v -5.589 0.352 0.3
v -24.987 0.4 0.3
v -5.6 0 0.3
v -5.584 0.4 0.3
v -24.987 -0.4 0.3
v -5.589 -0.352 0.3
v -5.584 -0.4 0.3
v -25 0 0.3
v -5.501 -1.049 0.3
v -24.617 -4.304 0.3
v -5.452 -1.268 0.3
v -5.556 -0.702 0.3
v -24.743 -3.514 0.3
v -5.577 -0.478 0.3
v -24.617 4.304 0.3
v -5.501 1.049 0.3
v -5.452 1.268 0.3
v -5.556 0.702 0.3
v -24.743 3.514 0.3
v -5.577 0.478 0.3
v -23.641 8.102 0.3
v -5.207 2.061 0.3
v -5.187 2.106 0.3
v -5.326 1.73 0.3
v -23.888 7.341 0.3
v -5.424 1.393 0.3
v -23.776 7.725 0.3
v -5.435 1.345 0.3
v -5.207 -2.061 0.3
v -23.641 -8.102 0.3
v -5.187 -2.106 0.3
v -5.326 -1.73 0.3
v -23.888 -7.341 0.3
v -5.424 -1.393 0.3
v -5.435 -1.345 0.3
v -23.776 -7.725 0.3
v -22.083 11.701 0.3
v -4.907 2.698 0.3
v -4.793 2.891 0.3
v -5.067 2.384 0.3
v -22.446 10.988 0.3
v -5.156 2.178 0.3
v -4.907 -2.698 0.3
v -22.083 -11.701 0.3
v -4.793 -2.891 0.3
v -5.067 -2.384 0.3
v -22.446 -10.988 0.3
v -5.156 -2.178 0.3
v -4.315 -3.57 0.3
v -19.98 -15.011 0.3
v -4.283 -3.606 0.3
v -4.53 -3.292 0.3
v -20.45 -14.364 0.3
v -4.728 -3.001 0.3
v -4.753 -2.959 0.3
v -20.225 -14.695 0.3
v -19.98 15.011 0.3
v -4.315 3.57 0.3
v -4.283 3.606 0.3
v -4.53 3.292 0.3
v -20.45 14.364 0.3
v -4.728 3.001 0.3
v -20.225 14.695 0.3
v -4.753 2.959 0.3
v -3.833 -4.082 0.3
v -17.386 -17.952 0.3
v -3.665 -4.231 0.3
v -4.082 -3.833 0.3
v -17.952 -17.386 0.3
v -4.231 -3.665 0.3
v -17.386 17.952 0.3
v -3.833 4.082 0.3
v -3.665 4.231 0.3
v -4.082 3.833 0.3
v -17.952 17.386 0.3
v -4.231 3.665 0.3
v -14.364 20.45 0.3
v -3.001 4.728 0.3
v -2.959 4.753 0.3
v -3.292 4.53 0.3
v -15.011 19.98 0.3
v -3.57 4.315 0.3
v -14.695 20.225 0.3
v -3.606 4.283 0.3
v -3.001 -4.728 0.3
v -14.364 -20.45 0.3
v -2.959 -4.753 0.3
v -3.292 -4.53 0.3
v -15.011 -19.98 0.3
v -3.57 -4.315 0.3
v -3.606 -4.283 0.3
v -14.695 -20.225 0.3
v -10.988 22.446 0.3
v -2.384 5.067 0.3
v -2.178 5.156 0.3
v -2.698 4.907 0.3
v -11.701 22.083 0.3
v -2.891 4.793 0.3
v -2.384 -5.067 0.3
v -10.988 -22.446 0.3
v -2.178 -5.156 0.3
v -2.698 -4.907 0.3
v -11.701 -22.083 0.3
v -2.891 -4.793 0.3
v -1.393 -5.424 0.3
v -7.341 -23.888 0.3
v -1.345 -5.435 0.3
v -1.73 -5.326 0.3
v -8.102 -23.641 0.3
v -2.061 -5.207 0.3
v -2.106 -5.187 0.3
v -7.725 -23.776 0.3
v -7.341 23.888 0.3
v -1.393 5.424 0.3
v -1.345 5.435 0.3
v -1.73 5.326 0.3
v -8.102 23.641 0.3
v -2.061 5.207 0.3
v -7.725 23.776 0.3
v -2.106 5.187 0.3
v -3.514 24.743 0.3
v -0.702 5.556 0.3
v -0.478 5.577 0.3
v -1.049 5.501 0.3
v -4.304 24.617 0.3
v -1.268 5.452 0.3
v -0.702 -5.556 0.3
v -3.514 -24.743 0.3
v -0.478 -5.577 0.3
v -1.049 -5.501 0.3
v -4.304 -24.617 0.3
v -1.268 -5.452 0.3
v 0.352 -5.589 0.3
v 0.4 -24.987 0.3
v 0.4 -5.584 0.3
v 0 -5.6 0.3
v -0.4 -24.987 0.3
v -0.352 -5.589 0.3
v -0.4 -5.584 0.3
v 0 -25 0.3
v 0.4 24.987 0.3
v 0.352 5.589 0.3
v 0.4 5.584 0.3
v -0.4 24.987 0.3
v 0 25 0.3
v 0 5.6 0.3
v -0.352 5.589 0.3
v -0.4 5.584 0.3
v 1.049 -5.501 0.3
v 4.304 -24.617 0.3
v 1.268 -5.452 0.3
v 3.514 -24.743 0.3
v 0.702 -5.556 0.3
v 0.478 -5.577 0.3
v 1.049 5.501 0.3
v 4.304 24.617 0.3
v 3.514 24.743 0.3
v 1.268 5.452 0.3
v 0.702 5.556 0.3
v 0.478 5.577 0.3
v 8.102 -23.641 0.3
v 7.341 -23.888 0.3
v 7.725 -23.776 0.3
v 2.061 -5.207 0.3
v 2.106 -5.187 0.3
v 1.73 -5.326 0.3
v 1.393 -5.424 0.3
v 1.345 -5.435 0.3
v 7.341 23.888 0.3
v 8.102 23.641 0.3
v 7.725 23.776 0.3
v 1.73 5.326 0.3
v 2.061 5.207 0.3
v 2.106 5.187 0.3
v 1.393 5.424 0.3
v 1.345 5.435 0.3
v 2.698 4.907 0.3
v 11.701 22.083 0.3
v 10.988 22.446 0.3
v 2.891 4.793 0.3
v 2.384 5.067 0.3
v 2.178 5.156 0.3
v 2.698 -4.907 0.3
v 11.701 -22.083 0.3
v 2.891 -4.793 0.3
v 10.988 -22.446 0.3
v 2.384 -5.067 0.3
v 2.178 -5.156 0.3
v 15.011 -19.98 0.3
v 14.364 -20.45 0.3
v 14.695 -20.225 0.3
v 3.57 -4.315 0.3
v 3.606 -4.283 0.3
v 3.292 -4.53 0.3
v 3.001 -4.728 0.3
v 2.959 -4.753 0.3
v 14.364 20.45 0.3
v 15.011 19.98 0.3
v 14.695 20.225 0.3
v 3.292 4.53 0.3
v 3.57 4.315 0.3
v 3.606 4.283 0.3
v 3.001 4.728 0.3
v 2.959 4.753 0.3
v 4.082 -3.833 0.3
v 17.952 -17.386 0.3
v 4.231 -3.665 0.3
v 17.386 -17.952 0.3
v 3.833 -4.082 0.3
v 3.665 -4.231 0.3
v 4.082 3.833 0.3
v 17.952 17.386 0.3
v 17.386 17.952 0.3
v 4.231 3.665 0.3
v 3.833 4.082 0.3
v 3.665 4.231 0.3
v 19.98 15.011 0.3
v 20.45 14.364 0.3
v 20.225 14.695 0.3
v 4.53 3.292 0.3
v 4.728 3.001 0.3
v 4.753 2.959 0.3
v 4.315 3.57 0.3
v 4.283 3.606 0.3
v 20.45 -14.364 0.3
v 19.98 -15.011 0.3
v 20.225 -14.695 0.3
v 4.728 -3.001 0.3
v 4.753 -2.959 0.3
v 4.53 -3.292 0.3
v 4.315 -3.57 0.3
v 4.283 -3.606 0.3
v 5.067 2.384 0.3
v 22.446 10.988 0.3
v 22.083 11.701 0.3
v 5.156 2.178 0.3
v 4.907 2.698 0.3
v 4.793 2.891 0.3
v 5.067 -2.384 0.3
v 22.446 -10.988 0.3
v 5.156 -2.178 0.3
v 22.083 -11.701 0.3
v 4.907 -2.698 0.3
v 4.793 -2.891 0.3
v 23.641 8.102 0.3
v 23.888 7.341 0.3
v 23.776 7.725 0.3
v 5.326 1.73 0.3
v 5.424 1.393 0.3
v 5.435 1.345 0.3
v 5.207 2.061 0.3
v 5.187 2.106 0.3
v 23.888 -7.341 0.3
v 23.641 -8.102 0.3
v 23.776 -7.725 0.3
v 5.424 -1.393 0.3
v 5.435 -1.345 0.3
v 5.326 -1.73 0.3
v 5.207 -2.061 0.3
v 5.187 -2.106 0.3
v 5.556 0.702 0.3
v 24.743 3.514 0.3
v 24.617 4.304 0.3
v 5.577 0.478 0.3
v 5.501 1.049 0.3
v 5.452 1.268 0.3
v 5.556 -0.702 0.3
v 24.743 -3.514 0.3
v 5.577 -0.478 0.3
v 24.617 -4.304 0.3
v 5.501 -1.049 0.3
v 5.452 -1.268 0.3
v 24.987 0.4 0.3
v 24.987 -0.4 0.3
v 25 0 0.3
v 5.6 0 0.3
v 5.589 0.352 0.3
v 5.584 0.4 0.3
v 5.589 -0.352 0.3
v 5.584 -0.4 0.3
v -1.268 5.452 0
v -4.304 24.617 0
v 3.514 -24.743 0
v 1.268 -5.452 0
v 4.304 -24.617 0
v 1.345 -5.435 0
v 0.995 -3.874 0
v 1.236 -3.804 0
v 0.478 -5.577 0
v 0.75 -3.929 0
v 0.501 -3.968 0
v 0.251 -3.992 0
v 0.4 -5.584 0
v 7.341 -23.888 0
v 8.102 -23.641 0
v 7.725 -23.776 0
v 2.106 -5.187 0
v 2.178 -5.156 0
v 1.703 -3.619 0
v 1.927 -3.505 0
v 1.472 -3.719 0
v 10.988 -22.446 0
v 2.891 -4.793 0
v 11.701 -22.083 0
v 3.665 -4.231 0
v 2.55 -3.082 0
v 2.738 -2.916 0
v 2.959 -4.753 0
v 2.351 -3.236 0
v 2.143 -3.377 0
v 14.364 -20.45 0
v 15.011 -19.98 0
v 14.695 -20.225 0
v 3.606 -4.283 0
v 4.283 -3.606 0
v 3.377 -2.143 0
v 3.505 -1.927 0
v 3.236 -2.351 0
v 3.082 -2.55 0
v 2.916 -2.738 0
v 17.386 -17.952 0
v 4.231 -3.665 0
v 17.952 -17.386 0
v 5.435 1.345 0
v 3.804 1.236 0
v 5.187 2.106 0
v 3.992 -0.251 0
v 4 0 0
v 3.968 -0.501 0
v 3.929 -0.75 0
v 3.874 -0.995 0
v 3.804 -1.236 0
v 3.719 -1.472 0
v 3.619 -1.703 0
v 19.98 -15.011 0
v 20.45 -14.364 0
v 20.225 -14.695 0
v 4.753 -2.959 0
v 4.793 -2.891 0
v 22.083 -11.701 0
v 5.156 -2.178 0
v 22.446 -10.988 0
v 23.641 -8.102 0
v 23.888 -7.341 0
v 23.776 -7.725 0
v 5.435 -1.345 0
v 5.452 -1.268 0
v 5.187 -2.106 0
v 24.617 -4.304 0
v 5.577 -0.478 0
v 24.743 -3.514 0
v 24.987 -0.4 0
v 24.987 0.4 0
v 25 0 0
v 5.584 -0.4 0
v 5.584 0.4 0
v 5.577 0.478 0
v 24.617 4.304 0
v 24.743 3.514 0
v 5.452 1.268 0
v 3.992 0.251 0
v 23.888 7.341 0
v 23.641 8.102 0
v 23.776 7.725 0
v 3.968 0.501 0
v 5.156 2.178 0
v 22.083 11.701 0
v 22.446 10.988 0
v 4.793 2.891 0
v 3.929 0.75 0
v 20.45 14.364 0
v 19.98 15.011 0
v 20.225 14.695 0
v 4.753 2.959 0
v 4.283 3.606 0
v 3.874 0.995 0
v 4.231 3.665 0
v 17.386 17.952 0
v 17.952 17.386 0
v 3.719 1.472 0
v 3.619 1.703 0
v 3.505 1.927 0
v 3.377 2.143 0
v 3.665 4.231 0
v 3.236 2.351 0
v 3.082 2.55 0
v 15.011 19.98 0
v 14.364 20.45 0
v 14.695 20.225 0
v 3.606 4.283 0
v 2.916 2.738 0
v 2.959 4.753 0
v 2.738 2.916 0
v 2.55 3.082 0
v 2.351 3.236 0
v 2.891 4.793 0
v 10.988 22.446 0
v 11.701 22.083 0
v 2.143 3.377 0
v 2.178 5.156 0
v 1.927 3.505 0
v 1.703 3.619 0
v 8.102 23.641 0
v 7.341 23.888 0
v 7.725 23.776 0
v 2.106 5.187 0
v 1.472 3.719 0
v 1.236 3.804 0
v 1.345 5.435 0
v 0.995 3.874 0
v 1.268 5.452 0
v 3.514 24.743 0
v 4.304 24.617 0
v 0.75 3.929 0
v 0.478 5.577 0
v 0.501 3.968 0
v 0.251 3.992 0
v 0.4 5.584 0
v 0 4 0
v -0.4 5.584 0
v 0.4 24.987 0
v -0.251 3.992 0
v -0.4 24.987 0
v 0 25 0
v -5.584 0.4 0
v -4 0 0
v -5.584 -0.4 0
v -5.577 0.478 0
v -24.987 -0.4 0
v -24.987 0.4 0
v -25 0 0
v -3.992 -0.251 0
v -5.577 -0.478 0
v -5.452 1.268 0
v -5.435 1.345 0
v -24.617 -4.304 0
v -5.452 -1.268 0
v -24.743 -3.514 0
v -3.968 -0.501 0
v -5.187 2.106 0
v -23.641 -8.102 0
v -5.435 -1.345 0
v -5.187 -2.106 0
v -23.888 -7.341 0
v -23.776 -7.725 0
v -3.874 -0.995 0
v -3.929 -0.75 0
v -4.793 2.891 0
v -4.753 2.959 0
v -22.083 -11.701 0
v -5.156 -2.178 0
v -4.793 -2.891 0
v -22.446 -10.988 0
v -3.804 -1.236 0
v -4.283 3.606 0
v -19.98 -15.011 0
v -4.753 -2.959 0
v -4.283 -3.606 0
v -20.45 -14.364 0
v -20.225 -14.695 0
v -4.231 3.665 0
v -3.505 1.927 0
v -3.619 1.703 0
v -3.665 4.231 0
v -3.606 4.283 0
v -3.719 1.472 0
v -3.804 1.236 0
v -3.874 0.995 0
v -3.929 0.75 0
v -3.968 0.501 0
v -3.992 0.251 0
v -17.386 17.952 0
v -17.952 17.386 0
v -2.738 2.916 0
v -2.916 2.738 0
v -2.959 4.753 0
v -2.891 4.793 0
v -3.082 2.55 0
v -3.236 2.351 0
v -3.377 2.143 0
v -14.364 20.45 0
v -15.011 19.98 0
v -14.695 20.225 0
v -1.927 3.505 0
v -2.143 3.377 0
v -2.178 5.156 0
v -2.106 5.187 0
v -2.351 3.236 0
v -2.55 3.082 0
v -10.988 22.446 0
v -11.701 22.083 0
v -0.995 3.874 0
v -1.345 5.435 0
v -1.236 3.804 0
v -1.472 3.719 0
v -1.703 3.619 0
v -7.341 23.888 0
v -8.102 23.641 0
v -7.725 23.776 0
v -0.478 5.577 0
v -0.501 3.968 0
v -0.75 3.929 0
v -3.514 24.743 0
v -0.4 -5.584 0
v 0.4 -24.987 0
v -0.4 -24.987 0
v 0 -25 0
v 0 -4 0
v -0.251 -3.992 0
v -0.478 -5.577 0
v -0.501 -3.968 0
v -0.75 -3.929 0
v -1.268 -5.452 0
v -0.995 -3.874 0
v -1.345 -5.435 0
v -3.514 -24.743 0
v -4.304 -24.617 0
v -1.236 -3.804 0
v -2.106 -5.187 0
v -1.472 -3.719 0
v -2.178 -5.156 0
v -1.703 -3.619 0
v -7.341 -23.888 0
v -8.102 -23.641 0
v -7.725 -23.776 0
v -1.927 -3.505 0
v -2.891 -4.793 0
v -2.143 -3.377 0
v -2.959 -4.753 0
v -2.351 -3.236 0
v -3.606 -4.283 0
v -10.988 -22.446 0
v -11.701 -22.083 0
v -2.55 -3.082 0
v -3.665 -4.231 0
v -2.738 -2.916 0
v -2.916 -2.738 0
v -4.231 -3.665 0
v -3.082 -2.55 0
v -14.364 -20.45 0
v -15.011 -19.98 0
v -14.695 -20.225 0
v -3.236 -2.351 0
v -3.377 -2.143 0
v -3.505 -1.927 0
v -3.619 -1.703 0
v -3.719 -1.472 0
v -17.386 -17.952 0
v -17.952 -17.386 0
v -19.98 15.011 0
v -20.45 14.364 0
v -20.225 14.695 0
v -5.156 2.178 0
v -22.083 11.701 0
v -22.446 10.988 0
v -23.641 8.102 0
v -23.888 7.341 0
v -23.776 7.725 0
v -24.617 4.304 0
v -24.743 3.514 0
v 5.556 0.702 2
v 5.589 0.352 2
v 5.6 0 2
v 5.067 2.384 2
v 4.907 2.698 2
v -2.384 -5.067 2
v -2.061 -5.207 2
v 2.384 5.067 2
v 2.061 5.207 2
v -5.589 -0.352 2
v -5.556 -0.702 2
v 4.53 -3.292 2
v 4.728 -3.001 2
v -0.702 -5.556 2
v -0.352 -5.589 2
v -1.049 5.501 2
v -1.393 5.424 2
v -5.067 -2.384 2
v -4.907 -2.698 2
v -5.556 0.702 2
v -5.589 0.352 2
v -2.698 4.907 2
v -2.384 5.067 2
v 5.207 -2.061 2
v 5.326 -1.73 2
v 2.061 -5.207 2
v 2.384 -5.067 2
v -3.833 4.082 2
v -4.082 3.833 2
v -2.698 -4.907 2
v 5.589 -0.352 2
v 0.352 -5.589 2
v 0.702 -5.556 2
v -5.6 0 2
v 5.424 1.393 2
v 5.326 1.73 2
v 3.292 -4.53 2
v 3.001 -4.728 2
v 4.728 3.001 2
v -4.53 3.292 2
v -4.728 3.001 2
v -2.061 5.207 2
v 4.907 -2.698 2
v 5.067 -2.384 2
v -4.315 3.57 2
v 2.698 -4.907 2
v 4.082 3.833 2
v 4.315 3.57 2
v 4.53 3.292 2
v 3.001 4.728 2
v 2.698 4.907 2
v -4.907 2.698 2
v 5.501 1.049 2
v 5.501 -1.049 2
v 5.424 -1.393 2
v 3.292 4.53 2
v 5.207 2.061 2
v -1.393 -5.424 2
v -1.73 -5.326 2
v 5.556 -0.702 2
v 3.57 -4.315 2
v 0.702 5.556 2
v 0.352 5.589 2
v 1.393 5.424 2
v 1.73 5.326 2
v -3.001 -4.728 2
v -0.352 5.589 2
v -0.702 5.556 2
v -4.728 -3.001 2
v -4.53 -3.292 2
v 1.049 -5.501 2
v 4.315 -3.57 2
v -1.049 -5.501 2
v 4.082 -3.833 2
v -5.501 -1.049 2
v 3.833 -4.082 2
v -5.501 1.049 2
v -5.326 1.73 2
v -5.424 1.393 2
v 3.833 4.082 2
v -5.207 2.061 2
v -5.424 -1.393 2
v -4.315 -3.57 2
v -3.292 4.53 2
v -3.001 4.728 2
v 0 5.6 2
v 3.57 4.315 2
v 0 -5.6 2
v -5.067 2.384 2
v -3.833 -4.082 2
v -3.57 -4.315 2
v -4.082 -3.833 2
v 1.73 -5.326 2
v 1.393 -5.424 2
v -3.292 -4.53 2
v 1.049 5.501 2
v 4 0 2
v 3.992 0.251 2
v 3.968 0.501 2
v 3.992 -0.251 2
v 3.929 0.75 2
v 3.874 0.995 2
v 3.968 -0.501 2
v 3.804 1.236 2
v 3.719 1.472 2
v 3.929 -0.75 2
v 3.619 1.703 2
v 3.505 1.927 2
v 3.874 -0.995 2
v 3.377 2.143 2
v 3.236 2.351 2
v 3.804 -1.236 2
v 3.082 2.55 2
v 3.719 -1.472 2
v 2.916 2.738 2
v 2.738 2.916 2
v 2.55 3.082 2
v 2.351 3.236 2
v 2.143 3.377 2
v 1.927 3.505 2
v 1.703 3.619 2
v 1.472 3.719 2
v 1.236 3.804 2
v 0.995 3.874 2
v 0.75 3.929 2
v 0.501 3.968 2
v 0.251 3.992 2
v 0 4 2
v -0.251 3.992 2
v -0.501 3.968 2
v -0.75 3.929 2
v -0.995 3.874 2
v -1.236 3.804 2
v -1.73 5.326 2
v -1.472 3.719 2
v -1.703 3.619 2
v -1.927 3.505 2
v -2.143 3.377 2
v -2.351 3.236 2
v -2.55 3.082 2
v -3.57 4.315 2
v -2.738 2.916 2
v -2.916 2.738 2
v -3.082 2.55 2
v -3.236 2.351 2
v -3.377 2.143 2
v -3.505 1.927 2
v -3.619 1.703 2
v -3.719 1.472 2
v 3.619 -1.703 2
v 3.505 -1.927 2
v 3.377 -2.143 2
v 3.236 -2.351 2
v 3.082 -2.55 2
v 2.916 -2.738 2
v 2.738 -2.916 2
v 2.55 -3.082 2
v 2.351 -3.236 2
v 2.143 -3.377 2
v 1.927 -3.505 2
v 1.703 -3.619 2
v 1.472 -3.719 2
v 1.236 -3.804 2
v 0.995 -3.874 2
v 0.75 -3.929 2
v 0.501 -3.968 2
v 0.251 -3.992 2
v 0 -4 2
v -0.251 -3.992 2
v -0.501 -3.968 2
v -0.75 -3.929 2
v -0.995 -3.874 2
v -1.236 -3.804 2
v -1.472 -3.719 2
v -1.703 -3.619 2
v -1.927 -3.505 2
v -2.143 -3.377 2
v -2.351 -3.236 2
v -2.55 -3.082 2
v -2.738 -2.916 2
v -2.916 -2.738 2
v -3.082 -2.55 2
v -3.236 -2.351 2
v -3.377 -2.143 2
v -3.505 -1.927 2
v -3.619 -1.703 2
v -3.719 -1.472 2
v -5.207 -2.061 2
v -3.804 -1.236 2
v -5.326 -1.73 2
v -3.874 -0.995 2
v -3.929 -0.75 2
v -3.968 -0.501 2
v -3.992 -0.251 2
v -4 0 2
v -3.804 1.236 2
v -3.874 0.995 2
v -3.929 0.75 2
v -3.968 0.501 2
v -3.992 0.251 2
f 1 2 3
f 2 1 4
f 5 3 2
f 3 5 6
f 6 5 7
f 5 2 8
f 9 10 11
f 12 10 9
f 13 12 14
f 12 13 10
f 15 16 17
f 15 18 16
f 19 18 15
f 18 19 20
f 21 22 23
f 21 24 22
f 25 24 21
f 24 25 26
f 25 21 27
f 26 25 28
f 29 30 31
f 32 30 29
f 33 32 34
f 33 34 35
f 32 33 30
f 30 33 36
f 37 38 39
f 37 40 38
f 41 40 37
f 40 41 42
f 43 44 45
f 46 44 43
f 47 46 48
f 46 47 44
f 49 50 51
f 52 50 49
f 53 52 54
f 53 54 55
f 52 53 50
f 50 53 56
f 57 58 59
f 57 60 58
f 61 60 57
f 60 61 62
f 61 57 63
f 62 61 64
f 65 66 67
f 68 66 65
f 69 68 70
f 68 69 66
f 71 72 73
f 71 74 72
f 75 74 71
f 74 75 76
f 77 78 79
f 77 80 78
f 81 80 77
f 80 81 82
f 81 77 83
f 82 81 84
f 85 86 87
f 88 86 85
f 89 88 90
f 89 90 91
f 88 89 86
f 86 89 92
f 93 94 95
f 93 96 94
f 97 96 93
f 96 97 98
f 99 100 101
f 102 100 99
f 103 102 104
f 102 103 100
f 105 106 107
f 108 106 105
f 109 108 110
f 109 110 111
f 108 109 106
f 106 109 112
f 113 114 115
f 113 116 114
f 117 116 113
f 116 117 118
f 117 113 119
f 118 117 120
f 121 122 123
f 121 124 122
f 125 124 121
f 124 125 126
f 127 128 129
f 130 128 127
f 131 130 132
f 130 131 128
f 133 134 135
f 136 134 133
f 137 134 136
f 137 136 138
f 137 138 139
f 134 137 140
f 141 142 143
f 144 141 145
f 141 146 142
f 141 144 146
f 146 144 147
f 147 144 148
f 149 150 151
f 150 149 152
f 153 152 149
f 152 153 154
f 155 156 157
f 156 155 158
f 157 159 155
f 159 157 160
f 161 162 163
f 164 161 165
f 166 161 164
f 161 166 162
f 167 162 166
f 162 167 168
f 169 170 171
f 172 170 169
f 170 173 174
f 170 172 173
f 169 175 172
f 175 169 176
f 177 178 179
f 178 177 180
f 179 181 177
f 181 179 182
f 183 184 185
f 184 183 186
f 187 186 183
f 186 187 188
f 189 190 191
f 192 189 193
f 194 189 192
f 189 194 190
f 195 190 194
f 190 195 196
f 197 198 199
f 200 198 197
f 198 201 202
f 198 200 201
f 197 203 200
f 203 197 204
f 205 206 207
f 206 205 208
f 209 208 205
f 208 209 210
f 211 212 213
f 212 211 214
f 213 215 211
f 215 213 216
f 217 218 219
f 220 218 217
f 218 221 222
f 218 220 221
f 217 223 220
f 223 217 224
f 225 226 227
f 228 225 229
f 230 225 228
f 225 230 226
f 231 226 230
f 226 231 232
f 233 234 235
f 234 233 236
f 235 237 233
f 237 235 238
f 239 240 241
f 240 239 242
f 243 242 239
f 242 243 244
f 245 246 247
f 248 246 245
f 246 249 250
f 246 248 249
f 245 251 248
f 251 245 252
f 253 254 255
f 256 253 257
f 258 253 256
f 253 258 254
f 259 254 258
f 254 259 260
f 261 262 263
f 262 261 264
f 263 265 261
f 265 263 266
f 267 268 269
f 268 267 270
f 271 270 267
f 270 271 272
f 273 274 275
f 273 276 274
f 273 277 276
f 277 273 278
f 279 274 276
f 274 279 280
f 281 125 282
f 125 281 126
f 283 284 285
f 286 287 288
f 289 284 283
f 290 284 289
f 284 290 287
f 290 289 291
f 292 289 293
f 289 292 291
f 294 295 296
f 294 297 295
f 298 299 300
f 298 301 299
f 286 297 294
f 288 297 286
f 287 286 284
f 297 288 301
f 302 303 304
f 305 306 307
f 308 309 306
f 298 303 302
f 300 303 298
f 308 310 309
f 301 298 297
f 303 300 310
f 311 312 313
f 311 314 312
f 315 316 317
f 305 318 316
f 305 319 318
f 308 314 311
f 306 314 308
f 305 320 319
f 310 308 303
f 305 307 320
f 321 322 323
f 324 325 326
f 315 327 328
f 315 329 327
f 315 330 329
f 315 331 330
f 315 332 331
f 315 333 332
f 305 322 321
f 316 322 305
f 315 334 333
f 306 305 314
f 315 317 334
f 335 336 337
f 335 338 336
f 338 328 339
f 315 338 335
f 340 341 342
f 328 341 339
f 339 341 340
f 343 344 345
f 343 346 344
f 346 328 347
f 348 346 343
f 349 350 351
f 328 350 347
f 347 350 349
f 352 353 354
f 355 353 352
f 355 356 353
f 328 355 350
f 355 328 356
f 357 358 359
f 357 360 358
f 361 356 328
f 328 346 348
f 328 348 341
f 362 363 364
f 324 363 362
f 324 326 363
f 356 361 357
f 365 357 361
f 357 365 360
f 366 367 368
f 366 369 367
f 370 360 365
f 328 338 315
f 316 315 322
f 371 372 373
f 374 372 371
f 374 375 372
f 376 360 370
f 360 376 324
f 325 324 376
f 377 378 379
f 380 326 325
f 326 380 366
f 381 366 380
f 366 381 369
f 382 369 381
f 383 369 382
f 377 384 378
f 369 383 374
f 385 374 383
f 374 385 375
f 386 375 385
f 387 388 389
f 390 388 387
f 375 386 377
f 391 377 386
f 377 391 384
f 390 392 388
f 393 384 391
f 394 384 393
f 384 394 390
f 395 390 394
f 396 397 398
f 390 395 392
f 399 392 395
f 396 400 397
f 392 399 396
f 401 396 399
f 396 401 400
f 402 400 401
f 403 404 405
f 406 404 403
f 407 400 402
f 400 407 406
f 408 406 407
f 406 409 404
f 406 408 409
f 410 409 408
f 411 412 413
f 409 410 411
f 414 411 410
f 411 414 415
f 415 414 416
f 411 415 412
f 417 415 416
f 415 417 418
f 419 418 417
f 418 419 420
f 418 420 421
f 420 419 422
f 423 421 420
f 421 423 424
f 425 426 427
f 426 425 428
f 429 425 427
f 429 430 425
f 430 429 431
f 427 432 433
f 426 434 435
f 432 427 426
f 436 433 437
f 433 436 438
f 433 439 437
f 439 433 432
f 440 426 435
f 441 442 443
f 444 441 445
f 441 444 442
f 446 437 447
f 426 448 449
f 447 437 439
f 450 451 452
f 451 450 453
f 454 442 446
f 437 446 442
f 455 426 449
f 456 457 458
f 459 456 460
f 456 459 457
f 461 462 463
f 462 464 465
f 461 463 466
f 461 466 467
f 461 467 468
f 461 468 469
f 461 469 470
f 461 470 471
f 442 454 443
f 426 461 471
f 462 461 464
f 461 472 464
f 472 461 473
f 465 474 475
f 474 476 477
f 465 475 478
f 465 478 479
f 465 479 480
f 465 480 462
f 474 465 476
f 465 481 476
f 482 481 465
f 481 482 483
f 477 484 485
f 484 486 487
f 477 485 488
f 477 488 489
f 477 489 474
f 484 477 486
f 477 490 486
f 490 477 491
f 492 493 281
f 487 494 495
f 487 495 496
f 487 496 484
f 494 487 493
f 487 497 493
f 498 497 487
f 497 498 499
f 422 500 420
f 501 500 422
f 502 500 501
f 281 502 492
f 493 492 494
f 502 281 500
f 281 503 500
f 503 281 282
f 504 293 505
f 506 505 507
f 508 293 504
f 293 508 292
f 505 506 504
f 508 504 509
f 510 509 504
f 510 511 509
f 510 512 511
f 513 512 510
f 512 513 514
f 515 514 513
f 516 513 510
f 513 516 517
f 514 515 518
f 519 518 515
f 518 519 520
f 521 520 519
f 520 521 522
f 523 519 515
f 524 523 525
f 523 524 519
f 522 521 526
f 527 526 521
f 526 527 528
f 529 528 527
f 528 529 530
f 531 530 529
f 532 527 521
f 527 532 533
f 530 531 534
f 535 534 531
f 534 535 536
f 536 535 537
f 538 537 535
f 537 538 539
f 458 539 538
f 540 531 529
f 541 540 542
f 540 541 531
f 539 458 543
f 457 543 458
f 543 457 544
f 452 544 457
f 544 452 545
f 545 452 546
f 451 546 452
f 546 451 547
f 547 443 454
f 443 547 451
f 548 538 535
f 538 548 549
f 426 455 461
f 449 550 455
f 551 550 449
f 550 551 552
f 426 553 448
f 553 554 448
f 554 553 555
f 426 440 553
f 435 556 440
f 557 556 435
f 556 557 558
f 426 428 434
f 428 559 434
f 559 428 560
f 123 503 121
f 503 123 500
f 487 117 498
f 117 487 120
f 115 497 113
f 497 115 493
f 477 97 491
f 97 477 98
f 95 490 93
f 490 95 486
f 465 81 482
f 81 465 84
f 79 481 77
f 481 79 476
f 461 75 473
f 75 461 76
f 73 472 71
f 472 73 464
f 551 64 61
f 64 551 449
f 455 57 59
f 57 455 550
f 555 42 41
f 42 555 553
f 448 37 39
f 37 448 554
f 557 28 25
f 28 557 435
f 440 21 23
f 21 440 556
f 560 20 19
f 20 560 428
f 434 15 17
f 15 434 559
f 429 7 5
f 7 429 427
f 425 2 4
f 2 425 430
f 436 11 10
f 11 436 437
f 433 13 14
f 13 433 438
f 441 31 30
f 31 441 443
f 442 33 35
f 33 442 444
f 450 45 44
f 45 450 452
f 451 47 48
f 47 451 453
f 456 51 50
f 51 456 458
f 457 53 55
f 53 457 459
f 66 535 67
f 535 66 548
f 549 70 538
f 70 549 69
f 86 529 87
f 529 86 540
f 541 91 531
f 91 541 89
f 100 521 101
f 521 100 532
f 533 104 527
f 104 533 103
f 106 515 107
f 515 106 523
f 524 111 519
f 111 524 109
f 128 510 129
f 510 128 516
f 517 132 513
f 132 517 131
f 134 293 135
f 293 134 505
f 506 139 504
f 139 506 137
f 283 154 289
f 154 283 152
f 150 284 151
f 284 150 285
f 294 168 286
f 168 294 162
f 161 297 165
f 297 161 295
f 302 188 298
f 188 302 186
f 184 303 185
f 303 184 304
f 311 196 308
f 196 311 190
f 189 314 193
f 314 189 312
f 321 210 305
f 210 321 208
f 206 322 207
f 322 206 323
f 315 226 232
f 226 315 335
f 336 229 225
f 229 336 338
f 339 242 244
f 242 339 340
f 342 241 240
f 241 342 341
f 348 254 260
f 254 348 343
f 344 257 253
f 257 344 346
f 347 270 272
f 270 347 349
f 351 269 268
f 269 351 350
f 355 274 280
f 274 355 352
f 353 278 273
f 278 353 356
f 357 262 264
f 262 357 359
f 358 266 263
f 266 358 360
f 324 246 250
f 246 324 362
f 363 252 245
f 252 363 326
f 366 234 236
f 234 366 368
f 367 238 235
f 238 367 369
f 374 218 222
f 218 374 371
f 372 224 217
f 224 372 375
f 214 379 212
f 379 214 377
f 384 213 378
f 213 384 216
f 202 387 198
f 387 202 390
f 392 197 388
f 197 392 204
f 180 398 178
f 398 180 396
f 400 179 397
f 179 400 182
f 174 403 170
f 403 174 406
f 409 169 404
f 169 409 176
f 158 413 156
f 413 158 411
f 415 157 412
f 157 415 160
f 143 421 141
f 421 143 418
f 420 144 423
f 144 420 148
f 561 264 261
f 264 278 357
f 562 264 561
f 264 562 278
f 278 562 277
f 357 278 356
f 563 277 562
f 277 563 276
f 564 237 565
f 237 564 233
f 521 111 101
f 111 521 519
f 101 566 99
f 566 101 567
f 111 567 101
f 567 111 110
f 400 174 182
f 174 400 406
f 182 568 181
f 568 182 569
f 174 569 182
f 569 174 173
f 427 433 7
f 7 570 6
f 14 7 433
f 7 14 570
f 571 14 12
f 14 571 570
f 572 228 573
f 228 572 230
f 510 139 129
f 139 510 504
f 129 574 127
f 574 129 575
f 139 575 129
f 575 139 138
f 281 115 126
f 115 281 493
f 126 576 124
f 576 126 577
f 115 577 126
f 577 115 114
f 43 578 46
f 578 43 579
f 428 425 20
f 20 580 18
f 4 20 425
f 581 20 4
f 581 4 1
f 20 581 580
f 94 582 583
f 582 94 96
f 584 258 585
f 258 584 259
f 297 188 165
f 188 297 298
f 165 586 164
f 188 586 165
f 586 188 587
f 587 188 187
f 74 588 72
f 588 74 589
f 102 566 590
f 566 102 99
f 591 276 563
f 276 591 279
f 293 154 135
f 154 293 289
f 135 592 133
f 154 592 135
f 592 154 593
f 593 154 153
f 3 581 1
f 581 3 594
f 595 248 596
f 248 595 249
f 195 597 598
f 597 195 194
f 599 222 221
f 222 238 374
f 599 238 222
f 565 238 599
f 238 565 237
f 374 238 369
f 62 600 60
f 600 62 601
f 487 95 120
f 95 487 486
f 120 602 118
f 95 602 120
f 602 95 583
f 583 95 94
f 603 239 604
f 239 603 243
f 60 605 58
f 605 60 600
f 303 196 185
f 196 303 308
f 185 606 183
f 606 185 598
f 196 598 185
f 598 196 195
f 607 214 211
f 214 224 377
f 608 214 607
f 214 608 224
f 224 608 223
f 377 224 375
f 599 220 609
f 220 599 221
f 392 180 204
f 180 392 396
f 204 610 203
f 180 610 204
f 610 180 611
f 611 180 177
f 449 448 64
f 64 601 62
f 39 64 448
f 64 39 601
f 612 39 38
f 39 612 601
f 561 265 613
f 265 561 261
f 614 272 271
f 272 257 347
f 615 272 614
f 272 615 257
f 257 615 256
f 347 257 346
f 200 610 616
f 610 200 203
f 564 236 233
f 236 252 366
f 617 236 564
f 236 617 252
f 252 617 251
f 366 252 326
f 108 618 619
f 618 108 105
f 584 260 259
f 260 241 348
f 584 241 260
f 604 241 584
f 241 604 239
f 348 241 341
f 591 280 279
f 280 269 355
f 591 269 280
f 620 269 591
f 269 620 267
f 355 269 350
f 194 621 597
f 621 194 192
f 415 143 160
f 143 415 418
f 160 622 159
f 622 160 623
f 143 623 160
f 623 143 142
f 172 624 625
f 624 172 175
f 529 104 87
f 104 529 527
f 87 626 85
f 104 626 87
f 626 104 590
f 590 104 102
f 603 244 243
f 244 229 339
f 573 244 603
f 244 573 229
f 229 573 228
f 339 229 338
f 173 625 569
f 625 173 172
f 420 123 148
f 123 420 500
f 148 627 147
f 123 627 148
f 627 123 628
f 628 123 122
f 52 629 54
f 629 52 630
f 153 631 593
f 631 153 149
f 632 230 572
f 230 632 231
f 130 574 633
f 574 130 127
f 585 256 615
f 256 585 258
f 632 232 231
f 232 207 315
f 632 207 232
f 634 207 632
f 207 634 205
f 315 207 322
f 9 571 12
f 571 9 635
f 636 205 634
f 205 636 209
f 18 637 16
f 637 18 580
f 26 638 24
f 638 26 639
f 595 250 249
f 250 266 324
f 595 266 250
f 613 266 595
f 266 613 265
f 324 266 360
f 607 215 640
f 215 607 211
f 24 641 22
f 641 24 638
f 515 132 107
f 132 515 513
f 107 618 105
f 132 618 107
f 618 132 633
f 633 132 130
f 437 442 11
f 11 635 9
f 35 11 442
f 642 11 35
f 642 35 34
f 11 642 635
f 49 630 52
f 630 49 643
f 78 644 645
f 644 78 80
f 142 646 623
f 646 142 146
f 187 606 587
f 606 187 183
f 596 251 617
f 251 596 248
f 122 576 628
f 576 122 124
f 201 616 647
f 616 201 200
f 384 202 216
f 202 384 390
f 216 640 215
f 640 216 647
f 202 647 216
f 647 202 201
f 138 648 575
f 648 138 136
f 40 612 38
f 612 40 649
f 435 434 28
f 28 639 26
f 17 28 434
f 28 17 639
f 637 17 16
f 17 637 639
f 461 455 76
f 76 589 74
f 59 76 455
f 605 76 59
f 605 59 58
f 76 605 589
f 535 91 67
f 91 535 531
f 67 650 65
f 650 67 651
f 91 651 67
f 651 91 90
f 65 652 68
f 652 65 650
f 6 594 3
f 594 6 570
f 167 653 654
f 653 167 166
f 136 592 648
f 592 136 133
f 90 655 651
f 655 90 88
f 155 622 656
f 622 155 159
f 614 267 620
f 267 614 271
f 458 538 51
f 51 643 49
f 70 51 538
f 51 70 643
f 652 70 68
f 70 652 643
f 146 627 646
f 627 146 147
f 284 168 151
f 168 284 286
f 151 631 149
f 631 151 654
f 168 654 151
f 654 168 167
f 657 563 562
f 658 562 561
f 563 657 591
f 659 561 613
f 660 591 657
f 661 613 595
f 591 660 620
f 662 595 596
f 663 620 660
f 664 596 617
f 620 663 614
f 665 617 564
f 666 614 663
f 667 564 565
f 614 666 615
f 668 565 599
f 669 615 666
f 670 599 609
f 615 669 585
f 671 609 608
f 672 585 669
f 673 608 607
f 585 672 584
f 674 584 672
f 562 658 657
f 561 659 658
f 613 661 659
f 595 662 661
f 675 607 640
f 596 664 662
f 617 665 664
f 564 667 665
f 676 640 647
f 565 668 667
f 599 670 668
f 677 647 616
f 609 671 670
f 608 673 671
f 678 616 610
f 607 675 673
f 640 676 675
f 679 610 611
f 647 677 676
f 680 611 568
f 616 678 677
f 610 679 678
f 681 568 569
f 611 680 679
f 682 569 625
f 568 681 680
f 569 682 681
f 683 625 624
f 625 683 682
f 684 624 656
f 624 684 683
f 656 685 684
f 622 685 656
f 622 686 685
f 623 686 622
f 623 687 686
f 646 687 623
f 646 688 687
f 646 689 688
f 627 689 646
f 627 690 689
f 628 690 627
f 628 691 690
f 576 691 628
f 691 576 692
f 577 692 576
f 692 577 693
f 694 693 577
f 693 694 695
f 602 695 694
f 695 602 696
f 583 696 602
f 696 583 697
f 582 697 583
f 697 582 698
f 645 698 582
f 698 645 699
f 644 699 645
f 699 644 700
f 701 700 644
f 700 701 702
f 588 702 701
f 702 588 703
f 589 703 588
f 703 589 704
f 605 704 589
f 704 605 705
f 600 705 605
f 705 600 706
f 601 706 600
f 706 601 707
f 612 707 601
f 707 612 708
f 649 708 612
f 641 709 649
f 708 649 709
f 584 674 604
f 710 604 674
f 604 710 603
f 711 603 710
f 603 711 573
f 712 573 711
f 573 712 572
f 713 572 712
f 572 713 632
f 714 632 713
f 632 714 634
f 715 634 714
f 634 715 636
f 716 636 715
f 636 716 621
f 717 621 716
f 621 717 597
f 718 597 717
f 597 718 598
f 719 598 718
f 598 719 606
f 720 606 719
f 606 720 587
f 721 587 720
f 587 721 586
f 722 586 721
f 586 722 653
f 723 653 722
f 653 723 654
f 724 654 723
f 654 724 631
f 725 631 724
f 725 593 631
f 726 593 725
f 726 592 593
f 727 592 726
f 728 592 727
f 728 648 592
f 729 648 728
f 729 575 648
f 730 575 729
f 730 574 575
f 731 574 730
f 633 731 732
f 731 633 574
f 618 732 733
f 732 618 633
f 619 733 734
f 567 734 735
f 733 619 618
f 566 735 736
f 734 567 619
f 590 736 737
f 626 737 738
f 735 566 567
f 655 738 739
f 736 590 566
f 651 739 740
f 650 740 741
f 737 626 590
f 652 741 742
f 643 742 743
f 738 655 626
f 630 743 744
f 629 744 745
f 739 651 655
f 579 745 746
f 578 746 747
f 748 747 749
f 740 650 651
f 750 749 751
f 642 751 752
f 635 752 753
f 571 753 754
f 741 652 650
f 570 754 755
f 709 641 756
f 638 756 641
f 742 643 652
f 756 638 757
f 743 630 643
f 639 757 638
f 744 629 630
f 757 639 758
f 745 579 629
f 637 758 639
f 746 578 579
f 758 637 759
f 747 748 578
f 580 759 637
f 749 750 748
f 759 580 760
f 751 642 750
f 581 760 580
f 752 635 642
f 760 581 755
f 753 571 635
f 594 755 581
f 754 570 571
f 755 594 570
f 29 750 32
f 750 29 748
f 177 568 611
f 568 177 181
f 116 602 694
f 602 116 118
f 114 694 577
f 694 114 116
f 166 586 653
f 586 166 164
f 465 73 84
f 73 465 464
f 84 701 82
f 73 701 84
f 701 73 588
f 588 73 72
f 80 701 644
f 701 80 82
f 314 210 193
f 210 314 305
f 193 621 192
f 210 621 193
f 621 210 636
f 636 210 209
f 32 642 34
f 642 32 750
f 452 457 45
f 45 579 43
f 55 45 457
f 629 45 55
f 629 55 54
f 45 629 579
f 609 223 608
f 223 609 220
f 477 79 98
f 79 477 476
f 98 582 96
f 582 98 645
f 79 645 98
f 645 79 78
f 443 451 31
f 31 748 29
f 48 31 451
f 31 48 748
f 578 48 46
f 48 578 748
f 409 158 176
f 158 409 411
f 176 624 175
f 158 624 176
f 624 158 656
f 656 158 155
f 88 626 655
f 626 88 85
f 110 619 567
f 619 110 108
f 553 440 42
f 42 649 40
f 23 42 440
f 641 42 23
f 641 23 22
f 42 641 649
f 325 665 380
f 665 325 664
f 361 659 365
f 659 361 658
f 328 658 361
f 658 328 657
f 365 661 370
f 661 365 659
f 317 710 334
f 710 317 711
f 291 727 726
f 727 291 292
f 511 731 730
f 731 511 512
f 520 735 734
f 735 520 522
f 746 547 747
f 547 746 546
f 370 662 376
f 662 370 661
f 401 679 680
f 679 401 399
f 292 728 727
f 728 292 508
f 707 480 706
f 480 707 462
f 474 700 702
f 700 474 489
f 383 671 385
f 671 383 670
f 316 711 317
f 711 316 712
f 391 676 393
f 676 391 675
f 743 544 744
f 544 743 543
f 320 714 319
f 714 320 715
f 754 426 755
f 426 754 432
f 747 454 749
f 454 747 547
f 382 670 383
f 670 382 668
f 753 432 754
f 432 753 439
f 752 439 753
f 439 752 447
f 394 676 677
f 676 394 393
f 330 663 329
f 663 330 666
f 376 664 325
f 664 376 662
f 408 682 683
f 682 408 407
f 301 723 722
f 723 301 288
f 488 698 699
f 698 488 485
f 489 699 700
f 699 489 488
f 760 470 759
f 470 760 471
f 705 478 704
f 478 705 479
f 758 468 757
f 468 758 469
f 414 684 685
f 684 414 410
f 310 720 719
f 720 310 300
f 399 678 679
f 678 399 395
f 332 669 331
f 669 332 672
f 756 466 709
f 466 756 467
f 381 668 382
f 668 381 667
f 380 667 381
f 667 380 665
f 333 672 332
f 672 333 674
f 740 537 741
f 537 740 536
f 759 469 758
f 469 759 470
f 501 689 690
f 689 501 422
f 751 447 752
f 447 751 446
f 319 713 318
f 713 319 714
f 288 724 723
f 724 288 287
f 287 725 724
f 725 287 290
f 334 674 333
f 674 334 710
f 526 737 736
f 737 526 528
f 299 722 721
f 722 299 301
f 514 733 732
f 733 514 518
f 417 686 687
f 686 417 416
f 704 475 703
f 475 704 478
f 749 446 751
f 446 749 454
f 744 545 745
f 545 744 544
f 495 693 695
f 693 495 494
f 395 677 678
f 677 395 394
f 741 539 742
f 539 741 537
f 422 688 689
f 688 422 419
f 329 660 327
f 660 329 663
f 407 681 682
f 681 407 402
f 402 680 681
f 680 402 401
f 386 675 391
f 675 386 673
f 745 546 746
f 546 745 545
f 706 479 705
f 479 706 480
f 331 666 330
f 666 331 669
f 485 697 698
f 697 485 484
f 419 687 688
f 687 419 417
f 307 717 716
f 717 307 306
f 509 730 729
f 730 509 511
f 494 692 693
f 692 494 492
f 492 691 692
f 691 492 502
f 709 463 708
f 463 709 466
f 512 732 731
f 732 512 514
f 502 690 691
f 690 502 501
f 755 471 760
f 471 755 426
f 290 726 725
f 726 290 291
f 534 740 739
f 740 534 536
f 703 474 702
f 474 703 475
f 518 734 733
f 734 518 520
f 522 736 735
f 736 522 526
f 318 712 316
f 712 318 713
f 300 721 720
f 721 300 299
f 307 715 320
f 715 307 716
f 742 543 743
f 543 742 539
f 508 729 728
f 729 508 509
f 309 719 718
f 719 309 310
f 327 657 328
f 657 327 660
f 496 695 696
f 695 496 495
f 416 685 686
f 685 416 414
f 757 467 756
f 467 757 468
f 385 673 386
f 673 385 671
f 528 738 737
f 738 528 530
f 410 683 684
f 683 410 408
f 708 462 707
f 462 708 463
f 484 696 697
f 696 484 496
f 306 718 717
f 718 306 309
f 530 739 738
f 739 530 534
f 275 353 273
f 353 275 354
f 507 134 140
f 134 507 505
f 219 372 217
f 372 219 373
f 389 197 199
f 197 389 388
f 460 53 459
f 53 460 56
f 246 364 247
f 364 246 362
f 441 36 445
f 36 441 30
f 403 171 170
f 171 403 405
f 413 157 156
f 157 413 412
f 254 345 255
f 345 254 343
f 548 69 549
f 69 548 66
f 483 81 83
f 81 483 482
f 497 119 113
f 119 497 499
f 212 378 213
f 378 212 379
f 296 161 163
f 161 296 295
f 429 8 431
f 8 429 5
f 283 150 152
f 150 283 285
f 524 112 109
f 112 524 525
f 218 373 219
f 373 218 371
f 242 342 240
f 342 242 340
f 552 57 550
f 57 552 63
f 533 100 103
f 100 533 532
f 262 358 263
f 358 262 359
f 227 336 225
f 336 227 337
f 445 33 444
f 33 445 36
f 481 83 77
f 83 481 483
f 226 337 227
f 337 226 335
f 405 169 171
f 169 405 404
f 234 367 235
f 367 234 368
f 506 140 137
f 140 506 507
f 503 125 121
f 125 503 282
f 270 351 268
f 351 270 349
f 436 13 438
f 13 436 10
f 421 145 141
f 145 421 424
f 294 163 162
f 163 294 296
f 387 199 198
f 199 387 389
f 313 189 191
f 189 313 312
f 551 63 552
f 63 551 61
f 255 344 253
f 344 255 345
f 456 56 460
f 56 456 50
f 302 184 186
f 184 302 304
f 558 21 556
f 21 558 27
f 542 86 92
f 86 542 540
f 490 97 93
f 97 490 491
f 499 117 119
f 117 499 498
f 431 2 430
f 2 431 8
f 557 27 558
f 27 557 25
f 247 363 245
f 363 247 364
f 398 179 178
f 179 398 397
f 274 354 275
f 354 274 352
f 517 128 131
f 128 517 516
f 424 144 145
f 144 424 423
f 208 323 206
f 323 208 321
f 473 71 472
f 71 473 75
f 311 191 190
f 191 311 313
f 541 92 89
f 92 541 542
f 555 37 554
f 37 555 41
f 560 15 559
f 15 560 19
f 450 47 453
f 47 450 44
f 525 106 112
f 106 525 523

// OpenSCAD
//bottle brush creator - v2.7.4
//Mark G. Peeters August 16, 2015 CC BY-SA
//inspired by drooloops flowers
//more details are posted here:
//https://www.youmagine.com/designs/bottle-brush-customizable/
//http://www.thingiverse.com/thing:980106
// preview[view:west, tilt:top diagonal]


/* [choose parts to print] */
//print what?
print=0;//[0:bristles_layer,1:centerpost]
//for keyed center only (see post settings tab) - number stagger layers used
staggers=2;//[2:two stagger parts,3:three stagger parts]
//which stagger to print, generate one at a time, NOTE!- there will be a notch made in the center support corresponding the the part number. So 1st part has one notch, 2nd part has 2 notches, etc
stag_num=1;//[1:1st stagger part,2:2nd stagger part,3:3rd stagger part]

/* [brush settings] */
//number of bristle per layer
b_number=40; //[1:50]
//outer radius of brush bristle
brush_od=25;//25
//center support radius outer OD
center_support=5.6;//5.6
//center support radius of hole ID
center_hole=4;//4

/* [central post settings] */
//center keyed? this make center a D hole
center_key=0;//[0:no,1:yes]
//decimal percent key depth from center zero to one
center_key_depth=0.6;//0.6
//length of central post
post_z=16;//16
//mount hole radius
post_mount_hole=2.2;//2.2
//fit tolerance, radius value
tol=0.2;//0.2

/* [advanced settings] */
//bristle width - flatness
b_width=0.8;//0.8
//bristle height - thickness
b_height=0.3;//0.3
//bristle layer spacing on shaft - how far in between bristles (NOTE: minimum setting is equal to bristle height
b_space_z=2;//2
//bristle rise above print bed, zero for flat, 0.3 or more for drooloop
b_rize=0.0;//0.0
//central post transition at tip
post_tip_z=0.7;//0.7
//central post mm to shrink at tip
post_tip_shrink=0.7;//0.7

/* [Hidden] */

//key rotation
key_rot=(360/b_number)/staggers;
//key_rot=40;

//handle parameters
//brush handle or mount hole (not used in 2.7)
handle=0;//[0:handle,1:mount hole]
handle_length=50;//length of handle if used
handle_radius=5;//radius for handle if used make smaller that hole
$fn=100;

if (print==0){//print bristle layer
   
    if (center_key==1){
   difference(){//put layer indicator on bristle
       union(){
  layer(b_number,b_width,brush_od,b_height,center_hole,center_support,b_space_z,b_rize);  
    holekey(center_hole,key_rot*stag_num,b_space_z,center_support,center_key_depth);
       }//end union
    translate([0,0,b_space_z-0.2])bristles_ind(stag_num,b_width,brush_od,b_height);
   }//end diff bristle indicator
  }
  
  if (center_key==0){
  layer(b_number,b_width,brush_od,b_height,center_hole,center_support,b_space_z,b_rize);  
  }
}
//end print choices



if (print==1){//print center post
    
if (handle==1){//add handle    
post(center_hole,post_z,center_key_depth,tol,post_tip_z,post_tip_shrink);
    translate([0,0,post_z])cylinder(r=handle_radius,h=handle_length);
}//end add handle          
  
   if (handle==0){//make hole    
   rotate([180,0,0])difference(){
post(center_hole,post_z,center_key_depth,tol,post_tip_z,post_tip_shrink);
    translate([0,0,-(post_tip_z+1)])cylinder(r=post_mount_hole,h=post_z+post_tip_z+5,$fn=100);
   }//end diff
}//end add hole  

//add cap
rotate([180,0,0])difference(){
translate([center_hole*3,0,post_z])cylinder(r=center_hole+1,h=1);
translate([center_hole*3,0,-(post_tip_z+1)])cylinder(r=post_mount_hole,h=post_z+post_tip_z+5,$fn=100);
   }//end diff
   
   
}
//end print choices



//make a layer-------------------------------------------
module layer(b_number,b_width,brush_od,b_height,center_hole,center_support,b_space_z,b_rize){
difference(){
// make the too long bristle shape
difference(){
    union(){
        translate([0,0,b_rize])bristles(b_number,b_width,brush_od+2,b_height);
        ring(center_hole,center_support,b_space_z);
    }//end union
    translate([0,0,-1])cylinder(r=center_hole,h=b_space_z+2);
  };//end diff
//trimm the bristles
  translate([0,0,-1])ring(brush_od,sqrt(brush_od*brush_od+(b_width*b_width)/4)+4,b_space_z+2);
  }//end layer diff
  
  
  }
  //end mod layer
  
  
//add key?-------------------
  module holekey(center_hole,key_rot,b_space_z,center_support,center_key_depth){
if (center_key==1){
difference(){
    translate((center_hole*(0.5+center_key_depth))*[sin(key_rot), -cos(key_rot),0])
    translate([0,0,b_space_z/2])
    rotate([0,0,key_rot])
    cube([center_support*2,center_hole,b_space_z],center=true);
    
    translate([0,0,-1])ring(center_support,center_support*2,b_space_z+2);
            }//end diff
            }//-----end add key------------------
        }
//end mod holekey---------------------------
  
     
//!bristles(b_number,b_width,brush_od,b_height);
module bristles(b_number,b_width,brush_od,b_height){
    for (i=[1:b_number]) {//single petal layer
			rotate ([0,0,i*360/b_number])
			color ("blue")
    translate([-b_width/2,0,0])cube([b_width,brush_od,b_height]);
		}//end i single petal layer
    };//end modle bristles
module ring(ring_inside,ring_outside,ring_height){
   difference(){
        cylinder(r=ring_outside,h=ring_height);
    translate([0,0,-1])cylinder(r=ring_inside,h=ring_height+2);
   }//end diff    
}//end mod ring

module bristles_ind(b_number,b_width,brush_od,b_height){
    for (i=[1:b_number]) {//single petal layer
			rotate ([0,0,i*30])
			color ("blue")
    translate([-b_width/2,0,0])cube([b_width,brush_od+2,b_height]);
		}//end i single petal layer
    };//end modle bristles




//!post(center_hole,tol);
module post(center_hole,post_z,center_key_depth,tol,post_tip_z,post_tip_shrink){
//main 
    keyed_cylinder(center_hole,post_z,center_key,center_key_depth,tol);
//tip for easy assembly
    hull(){
    keyed_cylinder(center_hole,0.01,center_key,center_key_depth,tol);
    translate([0,0,-post_tip_z])
    //scale([.9,.9,1])
    keyed_cylinder(center_hole-post_tip_shrink,0.01,center_key,center_key_depth,tol);
    }//end hull
//collar
    translate([0,0,post_z])cylinder(r=center_hole+1,h=1);   
};//end mod post


//!keyed_cylinder(center_hole,post_z,center_key,center_key_depth,tol);
module keyed_cylinder(od,tall,center_key,center_key_depth,tol){
    if (center_key==1){
difference(){
    cylinder(r=od-tol,h=tall);
    translate([0,((od*(0.5+center_key_depth))-tol),0])
    translate([0,0,tall/2])
    cube([od*2,od,tall+2],center=true);
    }//end diff
}//end if keyed
if (center_key==0){
cylinder(r=od-tol,h=tall);
}//end if not keyed
}
//end module keyed_cylinder
